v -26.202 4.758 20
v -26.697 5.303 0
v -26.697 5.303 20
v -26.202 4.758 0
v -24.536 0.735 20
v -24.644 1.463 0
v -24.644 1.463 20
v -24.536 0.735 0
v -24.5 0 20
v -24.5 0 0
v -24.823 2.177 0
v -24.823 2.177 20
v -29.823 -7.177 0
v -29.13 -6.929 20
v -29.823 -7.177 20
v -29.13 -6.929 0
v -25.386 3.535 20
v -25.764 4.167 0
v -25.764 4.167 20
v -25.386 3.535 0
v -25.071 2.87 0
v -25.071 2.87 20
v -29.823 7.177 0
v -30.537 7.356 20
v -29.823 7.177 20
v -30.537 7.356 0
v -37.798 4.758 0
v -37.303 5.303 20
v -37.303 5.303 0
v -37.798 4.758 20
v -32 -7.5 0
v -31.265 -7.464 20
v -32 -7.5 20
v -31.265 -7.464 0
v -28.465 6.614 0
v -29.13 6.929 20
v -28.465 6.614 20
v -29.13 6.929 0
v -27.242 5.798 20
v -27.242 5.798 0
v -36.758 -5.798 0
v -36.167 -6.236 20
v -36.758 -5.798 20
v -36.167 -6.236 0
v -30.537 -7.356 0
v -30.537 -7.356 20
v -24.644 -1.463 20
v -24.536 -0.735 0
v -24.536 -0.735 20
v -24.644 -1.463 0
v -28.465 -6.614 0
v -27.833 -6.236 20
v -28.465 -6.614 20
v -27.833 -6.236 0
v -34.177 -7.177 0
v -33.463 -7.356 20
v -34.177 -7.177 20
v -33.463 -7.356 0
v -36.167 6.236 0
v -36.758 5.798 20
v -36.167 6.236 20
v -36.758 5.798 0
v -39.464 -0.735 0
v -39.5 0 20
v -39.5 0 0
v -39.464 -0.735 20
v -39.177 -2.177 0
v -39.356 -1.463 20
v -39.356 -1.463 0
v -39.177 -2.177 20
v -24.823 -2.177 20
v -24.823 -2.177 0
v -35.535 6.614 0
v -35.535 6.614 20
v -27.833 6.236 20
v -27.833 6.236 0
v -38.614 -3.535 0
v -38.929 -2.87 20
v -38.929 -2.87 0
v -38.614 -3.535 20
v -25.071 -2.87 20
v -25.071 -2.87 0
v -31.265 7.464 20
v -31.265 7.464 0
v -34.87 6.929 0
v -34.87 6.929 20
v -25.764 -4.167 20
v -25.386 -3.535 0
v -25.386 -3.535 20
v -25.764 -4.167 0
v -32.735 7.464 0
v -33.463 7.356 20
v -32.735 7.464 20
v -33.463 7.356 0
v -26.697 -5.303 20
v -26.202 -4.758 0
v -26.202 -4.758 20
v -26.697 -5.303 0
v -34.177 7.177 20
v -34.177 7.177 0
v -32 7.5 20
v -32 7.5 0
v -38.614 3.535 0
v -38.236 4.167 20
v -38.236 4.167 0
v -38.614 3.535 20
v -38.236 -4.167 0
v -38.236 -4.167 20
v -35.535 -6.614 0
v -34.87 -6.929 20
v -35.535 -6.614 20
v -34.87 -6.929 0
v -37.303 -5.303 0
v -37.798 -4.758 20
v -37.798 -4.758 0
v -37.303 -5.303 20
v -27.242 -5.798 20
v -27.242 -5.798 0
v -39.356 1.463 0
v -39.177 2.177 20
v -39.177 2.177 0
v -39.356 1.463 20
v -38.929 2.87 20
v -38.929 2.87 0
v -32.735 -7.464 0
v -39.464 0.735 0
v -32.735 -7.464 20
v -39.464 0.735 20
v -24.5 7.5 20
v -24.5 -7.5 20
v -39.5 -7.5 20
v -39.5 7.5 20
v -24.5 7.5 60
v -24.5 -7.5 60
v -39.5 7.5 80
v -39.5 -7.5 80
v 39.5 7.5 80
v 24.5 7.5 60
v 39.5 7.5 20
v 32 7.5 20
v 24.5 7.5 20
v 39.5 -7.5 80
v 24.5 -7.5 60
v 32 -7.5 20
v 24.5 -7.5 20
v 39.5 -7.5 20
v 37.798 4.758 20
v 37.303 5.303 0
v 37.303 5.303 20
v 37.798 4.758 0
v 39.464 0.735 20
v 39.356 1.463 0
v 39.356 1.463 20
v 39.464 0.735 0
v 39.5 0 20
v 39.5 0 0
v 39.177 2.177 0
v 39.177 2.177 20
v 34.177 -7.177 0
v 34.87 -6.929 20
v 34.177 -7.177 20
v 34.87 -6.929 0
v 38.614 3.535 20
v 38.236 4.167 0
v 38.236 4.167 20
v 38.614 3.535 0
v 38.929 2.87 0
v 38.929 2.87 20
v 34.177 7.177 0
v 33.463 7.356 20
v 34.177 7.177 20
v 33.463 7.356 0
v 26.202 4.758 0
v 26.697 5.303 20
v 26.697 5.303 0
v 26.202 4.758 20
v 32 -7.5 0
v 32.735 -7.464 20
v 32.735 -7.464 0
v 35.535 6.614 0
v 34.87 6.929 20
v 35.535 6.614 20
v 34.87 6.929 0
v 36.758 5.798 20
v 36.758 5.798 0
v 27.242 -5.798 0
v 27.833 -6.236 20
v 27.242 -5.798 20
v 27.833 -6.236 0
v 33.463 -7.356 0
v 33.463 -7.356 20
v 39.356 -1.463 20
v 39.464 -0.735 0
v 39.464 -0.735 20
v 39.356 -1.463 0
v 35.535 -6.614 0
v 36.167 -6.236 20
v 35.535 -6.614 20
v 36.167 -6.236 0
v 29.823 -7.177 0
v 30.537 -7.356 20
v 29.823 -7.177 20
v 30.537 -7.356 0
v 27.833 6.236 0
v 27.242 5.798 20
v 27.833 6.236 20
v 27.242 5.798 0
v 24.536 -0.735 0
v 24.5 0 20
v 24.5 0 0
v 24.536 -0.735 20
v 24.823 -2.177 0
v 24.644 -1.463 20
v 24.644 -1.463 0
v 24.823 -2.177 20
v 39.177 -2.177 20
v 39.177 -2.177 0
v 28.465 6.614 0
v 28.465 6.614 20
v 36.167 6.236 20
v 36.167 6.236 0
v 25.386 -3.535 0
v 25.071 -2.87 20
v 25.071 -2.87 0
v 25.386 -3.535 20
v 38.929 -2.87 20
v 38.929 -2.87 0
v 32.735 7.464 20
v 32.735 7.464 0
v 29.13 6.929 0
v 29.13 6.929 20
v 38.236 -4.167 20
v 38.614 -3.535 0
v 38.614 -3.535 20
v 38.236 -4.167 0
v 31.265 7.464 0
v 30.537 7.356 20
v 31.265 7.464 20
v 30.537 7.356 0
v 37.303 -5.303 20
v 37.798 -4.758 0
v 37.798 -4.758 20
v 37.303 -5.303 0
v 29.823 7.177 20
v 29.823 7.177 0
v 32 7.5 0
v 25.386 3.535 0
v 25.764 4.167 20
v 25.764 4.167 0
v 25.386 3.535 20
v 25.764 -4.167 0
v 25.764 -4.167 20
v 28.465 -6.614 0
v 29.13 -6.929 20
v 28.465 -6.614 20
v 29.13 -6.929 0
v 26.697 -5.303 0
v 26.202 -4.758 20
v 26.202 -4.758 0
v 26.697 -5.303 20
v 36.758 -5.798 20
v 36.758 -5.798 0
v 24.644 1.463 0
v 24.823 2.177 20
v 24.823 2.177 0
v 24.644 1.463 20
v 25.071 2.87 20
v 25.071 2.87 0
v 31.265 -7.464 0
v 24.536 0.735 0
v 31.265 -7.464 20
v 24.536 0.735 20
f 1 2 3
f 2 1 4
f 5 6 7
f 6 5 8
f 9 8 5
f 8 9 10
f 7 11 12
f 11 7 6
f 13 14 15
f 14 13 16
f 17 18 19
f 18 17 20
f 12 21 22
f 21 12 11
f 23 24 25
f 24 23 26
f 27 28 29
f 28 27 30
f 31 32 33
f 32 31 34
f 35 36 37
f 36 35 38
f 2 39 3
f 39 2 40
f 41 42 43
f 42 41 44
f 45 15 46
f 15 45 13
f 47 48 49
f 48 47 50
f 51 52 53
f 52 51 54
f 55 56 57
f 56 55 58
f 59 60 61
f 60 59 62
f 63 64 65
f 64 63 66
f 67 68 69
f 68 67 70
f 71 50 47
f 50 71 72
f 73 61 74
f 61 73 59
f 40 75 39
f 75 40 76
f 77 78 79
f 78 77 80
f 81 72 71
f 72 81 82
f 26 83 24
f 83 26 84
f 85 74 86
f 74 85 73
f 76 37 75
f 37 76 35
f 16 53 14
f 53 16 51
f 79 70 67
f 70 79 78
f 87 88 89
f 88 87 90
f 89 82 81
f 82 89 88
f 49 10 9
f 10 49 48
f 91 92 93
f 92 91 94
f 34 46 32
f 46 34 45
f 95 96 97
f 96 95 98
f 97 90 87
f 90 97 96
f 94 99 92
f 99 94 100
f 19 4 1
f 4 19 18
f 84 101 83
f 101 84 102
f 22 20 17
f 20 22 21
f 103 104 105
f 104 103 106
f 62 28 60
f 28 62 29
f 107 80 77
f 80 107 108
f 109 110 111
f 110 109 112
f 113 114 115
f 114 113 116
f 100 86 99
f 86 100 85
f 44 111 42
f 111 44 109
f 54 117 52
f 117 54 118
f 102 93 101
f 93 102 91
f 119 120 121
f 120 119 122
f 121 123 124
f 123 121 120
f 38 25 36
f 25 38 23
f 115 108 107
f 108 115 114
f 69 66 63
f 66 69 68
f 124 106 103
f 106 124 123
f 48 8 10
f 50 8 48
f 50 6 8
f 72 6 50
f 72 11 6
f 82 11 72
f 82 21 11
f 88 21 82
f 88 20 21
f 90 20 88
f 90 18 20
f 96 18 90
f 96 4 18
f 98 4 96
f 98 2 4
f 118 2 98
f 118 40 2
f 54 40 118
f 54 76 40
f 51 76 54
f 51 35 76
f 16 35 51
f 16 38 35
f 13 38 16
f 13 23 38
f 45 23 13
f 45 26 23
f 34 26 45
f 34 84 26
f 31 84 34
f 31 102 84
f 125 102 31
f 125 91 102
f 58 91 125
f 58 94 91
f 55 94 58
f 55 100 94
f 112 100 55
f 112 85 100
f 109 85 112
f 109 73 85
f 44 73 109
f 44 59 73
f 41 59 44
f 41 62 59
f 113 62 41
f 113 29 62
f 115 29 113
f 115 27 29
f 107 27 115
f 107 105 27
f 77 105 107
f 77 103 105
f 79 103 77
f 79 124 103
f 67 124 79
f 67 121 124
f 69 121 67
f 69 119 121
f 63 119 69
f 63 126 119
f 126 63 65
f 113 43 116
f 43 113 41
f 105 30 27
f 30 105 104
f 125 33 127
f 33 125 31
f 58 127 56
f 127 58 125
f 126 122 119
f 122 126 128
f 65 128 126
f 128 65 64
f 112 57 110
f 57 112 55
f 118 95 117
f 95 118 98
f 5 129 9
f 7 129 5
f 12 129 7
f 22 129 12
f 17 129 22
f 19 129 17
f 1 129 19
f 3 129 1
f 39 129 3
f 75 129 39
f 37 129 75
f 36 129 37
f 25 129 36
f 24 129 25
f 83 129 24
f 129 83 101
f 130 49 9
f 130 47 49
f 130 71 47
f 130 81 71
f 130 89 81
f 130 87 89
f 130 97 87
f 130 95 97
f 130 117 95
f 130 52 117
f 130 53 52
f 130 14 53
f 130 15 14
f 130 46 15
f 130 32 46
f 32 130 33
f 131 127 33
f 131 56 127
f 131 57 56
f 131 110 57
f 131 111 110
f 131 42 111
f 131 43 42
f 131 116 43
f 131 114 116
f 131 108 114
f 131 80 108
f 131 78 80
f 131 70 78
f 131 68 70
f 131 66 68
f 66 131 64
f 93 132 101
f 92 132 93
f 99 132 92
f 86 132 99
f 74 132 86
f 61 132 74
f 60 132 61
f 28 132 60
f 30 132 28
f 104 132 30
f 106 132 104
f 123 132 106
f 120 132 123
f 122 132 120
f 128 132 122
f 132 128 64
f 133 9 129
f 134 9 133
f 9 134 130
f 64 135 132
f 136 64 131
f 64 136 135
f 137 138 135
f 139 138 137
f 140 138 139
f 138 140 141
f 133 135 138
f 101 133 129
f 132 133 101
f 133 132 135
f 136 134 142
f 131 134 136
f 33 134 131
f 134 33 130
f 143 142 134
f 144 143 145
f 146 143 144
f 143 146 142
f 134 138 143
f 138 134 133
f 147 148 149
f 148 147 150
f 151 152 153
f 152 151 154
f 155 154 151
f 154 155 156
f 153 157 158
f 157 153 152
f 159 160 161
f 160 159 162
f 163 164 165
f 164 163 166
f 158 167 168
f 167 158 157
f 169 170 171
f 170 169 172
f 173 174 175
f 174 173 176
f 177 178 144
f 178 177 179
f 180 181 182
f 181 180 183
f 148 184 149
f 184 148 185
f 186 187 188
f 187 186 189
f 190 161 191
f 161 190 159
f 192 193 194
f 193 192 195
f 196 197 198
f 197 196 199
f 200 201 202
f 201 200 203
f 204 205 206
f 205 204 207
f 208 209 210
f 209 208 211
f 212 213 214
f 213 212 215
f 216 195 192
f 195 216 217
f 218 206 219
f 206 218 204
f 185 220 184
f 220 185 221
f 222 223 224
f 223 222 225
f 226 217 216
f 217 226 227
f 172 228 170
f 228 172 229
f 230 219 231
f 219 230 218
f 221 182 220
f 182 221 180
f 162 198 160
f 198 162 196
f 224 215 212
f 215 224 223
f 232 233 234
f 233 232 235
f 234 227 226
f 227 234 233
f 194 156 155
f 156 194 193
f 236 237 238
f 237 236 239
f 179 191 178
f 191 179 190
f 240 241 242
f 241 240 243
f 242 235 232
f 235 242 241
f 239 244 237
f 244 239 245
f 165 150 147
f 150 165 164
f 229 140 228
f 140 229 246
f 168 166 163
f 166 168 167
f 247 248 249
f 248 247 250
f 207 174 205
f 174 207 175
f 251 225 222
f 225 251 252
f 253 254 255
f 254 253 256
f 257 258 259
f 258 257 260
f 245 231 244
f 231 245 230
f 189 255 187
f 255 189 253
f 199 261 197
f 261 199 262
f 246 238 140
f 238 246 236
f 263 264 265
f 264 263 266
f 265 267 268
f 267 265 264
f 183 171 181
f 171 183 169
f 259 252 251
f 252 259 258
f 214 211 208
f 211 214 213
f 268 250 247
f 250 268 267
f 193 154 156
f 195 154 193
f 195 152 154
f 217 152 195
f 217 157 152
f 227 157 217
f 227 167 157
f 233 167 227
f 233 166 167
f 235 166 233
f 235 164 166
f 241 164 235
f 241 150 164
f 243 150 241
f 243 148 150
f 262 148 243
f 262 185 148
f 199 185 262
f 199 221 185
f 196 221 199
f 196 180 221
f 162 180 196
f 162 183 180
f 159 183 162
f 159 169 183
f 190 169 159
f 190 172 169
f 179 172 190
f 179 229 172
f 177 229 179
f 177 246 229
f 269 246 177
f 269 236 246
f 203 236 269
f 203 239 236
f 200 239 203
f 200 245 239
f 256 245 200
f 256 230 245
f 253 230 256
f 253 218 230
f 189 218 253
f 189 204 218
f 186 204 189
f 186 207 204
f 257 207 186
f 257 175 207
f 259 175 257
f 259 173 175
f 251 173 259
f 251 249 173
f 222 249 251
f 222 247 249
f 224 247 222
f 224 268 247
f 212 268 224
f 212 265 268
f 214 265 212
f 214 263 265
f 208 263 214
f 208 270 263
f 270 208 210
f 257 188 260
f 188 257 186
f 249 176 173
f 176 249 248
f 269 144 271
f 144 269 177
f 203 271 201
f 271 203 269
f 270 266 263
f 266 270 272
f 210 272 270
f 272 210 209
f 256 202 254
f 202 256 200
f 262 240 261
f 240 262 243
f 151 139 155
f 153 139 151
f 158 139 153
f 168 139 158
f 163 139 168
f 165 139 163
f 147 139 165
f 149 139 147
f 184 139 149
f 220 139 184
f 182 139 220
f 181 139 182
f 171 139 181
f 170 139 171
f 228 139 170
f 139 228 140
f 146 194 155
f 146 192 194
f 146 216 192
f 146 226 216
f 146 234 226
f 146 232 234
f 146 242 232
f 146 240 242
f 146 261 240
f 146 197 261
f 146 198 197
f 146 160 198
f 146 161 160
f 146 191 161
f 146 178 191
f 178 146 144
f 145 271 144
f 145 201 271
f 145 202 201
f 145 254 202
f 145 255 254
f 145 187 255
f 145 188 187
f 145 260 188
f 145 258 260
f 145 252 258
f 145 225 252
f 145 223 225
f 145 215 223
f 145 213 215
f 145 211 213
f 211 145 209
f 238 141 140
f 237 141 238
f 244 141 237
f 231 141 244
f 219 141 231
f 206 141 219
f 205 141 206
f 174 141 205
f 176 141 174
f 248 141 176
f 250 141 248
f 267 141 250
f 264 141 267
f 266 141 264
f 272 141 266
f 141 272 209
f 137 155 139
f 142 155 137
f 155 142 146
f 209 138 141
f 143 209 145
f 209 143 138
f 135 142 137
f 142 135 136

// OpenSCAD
// Bridge / U-Frame — VERSTÄRKT
// Fokus: stabile Verbindungen, kein Support nötig
// alles in mm

$fn = 64;

// ---------- Parameter ----------
stand_h      = 68;
round_h      = 20;
round_r      = 7.5;

square_h     = stand_h - round_h;
square_side  = 15;

center_dist  = 64;

top_h        = 12;        // dicker als vorher
depth        = 15;

// Verstärkung
tenon_depth  = 8;         // Querbalken greift 8 mm in Ständer
tenon_width  = 10;        // Zapfenbreite
rib_thick    = 3;         // innere Rippen
rib_count    = 3;

// Abgeleitet
leg_x = center_dist/2;
top_w = center_dist + square_side;

// ---------- Module ----------
module leg(){
  difference(){
    union(){
      // rund unten
      cylinder(h = round_h, r = round_r);

      // quadratisch oben
      translate([-square_side/2, -square_side/2, round_h])
        cube([square_side, square_side, square_h]);
    }

    // Zapfenloch für Querbalken
    translate([-tenon_width/2,
               -depth/2,
               stand_h - tenon_depth])
      cube([tenon_width, depth, tenon_depth + 0.01]);
  }
}

module top_bar(){
  union(){
    // Hauptkörper
    translate([-top_w/2, -depth/2, stand_h - tenon_depth])
      cube([top_w, depth, top_h + tenon_depth]);

    // Zapfen links & rechts
    for(x = [-leg_x, leg_x])
      translate([x - tenon_width/2,
                 -depth/2,
                 stand_h - tenon_depth])
        cube([tenon_width, depth, tenon_depth]);

    // innere Rippen gegen Durchbiegen
    for(i = [1:rib_count])
      translate([
        -top_w/2 + i*(top_w/(rib_count+1)) - rib_thick/2,
        -depth/2,
        stand_h - tenon_depth
      ])
        cube([rib_thick, depth, top_h + tenon_depth]);
  }
}

module bridge(){
  union(){
    translate([-leg_x, 0, 0]) leg();
    translate([ leg_x, 0, 0]) leg();
    top_bar();
  }
}

// ---------- Ausgabe ----------
bridge();
